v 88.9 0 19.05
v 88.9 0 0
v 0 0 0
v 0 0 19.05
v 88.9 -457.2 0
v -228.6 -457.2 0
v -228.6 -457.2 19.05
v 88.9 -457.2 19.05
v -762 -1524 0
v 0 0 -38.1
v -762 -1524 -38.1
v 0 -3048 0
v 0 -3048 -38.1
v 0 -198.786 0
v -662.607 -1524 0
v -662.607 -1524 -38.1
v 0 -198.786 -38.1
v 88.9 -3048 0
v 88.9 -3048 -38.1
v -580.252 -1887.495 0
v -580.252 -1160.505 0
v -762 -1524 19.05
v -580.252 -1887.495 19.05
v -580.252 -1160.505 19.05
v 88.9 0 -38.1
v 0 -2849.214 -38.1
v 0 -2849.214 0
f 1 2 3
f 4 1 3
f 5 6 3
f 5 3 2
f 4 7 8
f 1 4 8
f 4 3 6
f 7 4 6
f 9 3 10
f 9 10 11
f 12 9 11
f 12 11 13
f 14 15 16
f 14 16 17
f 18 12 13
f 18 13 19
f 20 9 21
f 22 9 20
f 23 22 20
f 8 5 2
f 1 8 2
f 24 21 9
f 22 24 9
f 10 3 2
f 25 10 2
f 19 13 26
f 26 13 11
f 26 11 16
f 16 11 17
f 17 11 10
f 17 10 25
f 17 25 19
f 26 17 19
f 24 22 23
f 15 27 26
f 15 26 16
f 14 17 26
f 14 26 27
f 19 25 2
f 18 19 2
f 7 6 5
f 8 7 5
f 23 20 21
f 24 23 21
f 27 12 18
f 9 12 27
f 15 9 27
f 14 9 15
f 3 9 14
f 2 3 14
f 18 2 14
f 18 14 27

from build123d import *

# Parameters (mm, degrees)
F0_W     = 88.9
F0_H     = 38.1
F1_DEPTH = 3048
F3_DEPTH = 38.1
F5_DEPTH = 38.1
F7_DEPTH = 19.05
F9_DEPTH = 19.05


with BuildPart() as f1:
    # F0 (on Front) → F1 (new body)
    with BuildSketch(Plane.XZ):
        with Locations((44.45, -19.05)):
            Rectangle(F0_W, F0_H)
    extrude(amount=F1_DEPTH)

    # F2 (on Top) → F3 (join)
    with BuildSketch(Plane.XY):
        Polygon((79.514577, -39.757289), (0, 0), (-762, -1524), (-682.485423, -1563.757288), align=None)
    extrude(amount=-F3_DEPTH)

    # F4 (on Top) → F5 (join)
    with BuildSketch(Plane.XY):
        Polygon((-682.485423, -1484.242711), (-762, -1524), (0, -3048), (79.514577, -3008.242711), align=None)
    extrude(amount=-F5_DEPTH)


with BuildPart() as f7:
    # F6 (on face) → F7 (new body)
    with BuildSketch(Plane.XY):
        Polygon((-228.6, -457.2), (88.9, -457.2), (88.9, 0), (0, 0), align=None)
    extrude(amount=F7_DEPTH)


with BuildPart() as f9:
    # F8 (on face) → F9 (new body)
    with BuildSketch(Plane.XY):
        Polygon((-580.252395, -1160.504789), (-762, -1524), (-580.252395, -1887.49521), align=None)
    extrude(amount=F9_DEPTH)


solid = Compound([f1.part, f7.part, f9.part])
